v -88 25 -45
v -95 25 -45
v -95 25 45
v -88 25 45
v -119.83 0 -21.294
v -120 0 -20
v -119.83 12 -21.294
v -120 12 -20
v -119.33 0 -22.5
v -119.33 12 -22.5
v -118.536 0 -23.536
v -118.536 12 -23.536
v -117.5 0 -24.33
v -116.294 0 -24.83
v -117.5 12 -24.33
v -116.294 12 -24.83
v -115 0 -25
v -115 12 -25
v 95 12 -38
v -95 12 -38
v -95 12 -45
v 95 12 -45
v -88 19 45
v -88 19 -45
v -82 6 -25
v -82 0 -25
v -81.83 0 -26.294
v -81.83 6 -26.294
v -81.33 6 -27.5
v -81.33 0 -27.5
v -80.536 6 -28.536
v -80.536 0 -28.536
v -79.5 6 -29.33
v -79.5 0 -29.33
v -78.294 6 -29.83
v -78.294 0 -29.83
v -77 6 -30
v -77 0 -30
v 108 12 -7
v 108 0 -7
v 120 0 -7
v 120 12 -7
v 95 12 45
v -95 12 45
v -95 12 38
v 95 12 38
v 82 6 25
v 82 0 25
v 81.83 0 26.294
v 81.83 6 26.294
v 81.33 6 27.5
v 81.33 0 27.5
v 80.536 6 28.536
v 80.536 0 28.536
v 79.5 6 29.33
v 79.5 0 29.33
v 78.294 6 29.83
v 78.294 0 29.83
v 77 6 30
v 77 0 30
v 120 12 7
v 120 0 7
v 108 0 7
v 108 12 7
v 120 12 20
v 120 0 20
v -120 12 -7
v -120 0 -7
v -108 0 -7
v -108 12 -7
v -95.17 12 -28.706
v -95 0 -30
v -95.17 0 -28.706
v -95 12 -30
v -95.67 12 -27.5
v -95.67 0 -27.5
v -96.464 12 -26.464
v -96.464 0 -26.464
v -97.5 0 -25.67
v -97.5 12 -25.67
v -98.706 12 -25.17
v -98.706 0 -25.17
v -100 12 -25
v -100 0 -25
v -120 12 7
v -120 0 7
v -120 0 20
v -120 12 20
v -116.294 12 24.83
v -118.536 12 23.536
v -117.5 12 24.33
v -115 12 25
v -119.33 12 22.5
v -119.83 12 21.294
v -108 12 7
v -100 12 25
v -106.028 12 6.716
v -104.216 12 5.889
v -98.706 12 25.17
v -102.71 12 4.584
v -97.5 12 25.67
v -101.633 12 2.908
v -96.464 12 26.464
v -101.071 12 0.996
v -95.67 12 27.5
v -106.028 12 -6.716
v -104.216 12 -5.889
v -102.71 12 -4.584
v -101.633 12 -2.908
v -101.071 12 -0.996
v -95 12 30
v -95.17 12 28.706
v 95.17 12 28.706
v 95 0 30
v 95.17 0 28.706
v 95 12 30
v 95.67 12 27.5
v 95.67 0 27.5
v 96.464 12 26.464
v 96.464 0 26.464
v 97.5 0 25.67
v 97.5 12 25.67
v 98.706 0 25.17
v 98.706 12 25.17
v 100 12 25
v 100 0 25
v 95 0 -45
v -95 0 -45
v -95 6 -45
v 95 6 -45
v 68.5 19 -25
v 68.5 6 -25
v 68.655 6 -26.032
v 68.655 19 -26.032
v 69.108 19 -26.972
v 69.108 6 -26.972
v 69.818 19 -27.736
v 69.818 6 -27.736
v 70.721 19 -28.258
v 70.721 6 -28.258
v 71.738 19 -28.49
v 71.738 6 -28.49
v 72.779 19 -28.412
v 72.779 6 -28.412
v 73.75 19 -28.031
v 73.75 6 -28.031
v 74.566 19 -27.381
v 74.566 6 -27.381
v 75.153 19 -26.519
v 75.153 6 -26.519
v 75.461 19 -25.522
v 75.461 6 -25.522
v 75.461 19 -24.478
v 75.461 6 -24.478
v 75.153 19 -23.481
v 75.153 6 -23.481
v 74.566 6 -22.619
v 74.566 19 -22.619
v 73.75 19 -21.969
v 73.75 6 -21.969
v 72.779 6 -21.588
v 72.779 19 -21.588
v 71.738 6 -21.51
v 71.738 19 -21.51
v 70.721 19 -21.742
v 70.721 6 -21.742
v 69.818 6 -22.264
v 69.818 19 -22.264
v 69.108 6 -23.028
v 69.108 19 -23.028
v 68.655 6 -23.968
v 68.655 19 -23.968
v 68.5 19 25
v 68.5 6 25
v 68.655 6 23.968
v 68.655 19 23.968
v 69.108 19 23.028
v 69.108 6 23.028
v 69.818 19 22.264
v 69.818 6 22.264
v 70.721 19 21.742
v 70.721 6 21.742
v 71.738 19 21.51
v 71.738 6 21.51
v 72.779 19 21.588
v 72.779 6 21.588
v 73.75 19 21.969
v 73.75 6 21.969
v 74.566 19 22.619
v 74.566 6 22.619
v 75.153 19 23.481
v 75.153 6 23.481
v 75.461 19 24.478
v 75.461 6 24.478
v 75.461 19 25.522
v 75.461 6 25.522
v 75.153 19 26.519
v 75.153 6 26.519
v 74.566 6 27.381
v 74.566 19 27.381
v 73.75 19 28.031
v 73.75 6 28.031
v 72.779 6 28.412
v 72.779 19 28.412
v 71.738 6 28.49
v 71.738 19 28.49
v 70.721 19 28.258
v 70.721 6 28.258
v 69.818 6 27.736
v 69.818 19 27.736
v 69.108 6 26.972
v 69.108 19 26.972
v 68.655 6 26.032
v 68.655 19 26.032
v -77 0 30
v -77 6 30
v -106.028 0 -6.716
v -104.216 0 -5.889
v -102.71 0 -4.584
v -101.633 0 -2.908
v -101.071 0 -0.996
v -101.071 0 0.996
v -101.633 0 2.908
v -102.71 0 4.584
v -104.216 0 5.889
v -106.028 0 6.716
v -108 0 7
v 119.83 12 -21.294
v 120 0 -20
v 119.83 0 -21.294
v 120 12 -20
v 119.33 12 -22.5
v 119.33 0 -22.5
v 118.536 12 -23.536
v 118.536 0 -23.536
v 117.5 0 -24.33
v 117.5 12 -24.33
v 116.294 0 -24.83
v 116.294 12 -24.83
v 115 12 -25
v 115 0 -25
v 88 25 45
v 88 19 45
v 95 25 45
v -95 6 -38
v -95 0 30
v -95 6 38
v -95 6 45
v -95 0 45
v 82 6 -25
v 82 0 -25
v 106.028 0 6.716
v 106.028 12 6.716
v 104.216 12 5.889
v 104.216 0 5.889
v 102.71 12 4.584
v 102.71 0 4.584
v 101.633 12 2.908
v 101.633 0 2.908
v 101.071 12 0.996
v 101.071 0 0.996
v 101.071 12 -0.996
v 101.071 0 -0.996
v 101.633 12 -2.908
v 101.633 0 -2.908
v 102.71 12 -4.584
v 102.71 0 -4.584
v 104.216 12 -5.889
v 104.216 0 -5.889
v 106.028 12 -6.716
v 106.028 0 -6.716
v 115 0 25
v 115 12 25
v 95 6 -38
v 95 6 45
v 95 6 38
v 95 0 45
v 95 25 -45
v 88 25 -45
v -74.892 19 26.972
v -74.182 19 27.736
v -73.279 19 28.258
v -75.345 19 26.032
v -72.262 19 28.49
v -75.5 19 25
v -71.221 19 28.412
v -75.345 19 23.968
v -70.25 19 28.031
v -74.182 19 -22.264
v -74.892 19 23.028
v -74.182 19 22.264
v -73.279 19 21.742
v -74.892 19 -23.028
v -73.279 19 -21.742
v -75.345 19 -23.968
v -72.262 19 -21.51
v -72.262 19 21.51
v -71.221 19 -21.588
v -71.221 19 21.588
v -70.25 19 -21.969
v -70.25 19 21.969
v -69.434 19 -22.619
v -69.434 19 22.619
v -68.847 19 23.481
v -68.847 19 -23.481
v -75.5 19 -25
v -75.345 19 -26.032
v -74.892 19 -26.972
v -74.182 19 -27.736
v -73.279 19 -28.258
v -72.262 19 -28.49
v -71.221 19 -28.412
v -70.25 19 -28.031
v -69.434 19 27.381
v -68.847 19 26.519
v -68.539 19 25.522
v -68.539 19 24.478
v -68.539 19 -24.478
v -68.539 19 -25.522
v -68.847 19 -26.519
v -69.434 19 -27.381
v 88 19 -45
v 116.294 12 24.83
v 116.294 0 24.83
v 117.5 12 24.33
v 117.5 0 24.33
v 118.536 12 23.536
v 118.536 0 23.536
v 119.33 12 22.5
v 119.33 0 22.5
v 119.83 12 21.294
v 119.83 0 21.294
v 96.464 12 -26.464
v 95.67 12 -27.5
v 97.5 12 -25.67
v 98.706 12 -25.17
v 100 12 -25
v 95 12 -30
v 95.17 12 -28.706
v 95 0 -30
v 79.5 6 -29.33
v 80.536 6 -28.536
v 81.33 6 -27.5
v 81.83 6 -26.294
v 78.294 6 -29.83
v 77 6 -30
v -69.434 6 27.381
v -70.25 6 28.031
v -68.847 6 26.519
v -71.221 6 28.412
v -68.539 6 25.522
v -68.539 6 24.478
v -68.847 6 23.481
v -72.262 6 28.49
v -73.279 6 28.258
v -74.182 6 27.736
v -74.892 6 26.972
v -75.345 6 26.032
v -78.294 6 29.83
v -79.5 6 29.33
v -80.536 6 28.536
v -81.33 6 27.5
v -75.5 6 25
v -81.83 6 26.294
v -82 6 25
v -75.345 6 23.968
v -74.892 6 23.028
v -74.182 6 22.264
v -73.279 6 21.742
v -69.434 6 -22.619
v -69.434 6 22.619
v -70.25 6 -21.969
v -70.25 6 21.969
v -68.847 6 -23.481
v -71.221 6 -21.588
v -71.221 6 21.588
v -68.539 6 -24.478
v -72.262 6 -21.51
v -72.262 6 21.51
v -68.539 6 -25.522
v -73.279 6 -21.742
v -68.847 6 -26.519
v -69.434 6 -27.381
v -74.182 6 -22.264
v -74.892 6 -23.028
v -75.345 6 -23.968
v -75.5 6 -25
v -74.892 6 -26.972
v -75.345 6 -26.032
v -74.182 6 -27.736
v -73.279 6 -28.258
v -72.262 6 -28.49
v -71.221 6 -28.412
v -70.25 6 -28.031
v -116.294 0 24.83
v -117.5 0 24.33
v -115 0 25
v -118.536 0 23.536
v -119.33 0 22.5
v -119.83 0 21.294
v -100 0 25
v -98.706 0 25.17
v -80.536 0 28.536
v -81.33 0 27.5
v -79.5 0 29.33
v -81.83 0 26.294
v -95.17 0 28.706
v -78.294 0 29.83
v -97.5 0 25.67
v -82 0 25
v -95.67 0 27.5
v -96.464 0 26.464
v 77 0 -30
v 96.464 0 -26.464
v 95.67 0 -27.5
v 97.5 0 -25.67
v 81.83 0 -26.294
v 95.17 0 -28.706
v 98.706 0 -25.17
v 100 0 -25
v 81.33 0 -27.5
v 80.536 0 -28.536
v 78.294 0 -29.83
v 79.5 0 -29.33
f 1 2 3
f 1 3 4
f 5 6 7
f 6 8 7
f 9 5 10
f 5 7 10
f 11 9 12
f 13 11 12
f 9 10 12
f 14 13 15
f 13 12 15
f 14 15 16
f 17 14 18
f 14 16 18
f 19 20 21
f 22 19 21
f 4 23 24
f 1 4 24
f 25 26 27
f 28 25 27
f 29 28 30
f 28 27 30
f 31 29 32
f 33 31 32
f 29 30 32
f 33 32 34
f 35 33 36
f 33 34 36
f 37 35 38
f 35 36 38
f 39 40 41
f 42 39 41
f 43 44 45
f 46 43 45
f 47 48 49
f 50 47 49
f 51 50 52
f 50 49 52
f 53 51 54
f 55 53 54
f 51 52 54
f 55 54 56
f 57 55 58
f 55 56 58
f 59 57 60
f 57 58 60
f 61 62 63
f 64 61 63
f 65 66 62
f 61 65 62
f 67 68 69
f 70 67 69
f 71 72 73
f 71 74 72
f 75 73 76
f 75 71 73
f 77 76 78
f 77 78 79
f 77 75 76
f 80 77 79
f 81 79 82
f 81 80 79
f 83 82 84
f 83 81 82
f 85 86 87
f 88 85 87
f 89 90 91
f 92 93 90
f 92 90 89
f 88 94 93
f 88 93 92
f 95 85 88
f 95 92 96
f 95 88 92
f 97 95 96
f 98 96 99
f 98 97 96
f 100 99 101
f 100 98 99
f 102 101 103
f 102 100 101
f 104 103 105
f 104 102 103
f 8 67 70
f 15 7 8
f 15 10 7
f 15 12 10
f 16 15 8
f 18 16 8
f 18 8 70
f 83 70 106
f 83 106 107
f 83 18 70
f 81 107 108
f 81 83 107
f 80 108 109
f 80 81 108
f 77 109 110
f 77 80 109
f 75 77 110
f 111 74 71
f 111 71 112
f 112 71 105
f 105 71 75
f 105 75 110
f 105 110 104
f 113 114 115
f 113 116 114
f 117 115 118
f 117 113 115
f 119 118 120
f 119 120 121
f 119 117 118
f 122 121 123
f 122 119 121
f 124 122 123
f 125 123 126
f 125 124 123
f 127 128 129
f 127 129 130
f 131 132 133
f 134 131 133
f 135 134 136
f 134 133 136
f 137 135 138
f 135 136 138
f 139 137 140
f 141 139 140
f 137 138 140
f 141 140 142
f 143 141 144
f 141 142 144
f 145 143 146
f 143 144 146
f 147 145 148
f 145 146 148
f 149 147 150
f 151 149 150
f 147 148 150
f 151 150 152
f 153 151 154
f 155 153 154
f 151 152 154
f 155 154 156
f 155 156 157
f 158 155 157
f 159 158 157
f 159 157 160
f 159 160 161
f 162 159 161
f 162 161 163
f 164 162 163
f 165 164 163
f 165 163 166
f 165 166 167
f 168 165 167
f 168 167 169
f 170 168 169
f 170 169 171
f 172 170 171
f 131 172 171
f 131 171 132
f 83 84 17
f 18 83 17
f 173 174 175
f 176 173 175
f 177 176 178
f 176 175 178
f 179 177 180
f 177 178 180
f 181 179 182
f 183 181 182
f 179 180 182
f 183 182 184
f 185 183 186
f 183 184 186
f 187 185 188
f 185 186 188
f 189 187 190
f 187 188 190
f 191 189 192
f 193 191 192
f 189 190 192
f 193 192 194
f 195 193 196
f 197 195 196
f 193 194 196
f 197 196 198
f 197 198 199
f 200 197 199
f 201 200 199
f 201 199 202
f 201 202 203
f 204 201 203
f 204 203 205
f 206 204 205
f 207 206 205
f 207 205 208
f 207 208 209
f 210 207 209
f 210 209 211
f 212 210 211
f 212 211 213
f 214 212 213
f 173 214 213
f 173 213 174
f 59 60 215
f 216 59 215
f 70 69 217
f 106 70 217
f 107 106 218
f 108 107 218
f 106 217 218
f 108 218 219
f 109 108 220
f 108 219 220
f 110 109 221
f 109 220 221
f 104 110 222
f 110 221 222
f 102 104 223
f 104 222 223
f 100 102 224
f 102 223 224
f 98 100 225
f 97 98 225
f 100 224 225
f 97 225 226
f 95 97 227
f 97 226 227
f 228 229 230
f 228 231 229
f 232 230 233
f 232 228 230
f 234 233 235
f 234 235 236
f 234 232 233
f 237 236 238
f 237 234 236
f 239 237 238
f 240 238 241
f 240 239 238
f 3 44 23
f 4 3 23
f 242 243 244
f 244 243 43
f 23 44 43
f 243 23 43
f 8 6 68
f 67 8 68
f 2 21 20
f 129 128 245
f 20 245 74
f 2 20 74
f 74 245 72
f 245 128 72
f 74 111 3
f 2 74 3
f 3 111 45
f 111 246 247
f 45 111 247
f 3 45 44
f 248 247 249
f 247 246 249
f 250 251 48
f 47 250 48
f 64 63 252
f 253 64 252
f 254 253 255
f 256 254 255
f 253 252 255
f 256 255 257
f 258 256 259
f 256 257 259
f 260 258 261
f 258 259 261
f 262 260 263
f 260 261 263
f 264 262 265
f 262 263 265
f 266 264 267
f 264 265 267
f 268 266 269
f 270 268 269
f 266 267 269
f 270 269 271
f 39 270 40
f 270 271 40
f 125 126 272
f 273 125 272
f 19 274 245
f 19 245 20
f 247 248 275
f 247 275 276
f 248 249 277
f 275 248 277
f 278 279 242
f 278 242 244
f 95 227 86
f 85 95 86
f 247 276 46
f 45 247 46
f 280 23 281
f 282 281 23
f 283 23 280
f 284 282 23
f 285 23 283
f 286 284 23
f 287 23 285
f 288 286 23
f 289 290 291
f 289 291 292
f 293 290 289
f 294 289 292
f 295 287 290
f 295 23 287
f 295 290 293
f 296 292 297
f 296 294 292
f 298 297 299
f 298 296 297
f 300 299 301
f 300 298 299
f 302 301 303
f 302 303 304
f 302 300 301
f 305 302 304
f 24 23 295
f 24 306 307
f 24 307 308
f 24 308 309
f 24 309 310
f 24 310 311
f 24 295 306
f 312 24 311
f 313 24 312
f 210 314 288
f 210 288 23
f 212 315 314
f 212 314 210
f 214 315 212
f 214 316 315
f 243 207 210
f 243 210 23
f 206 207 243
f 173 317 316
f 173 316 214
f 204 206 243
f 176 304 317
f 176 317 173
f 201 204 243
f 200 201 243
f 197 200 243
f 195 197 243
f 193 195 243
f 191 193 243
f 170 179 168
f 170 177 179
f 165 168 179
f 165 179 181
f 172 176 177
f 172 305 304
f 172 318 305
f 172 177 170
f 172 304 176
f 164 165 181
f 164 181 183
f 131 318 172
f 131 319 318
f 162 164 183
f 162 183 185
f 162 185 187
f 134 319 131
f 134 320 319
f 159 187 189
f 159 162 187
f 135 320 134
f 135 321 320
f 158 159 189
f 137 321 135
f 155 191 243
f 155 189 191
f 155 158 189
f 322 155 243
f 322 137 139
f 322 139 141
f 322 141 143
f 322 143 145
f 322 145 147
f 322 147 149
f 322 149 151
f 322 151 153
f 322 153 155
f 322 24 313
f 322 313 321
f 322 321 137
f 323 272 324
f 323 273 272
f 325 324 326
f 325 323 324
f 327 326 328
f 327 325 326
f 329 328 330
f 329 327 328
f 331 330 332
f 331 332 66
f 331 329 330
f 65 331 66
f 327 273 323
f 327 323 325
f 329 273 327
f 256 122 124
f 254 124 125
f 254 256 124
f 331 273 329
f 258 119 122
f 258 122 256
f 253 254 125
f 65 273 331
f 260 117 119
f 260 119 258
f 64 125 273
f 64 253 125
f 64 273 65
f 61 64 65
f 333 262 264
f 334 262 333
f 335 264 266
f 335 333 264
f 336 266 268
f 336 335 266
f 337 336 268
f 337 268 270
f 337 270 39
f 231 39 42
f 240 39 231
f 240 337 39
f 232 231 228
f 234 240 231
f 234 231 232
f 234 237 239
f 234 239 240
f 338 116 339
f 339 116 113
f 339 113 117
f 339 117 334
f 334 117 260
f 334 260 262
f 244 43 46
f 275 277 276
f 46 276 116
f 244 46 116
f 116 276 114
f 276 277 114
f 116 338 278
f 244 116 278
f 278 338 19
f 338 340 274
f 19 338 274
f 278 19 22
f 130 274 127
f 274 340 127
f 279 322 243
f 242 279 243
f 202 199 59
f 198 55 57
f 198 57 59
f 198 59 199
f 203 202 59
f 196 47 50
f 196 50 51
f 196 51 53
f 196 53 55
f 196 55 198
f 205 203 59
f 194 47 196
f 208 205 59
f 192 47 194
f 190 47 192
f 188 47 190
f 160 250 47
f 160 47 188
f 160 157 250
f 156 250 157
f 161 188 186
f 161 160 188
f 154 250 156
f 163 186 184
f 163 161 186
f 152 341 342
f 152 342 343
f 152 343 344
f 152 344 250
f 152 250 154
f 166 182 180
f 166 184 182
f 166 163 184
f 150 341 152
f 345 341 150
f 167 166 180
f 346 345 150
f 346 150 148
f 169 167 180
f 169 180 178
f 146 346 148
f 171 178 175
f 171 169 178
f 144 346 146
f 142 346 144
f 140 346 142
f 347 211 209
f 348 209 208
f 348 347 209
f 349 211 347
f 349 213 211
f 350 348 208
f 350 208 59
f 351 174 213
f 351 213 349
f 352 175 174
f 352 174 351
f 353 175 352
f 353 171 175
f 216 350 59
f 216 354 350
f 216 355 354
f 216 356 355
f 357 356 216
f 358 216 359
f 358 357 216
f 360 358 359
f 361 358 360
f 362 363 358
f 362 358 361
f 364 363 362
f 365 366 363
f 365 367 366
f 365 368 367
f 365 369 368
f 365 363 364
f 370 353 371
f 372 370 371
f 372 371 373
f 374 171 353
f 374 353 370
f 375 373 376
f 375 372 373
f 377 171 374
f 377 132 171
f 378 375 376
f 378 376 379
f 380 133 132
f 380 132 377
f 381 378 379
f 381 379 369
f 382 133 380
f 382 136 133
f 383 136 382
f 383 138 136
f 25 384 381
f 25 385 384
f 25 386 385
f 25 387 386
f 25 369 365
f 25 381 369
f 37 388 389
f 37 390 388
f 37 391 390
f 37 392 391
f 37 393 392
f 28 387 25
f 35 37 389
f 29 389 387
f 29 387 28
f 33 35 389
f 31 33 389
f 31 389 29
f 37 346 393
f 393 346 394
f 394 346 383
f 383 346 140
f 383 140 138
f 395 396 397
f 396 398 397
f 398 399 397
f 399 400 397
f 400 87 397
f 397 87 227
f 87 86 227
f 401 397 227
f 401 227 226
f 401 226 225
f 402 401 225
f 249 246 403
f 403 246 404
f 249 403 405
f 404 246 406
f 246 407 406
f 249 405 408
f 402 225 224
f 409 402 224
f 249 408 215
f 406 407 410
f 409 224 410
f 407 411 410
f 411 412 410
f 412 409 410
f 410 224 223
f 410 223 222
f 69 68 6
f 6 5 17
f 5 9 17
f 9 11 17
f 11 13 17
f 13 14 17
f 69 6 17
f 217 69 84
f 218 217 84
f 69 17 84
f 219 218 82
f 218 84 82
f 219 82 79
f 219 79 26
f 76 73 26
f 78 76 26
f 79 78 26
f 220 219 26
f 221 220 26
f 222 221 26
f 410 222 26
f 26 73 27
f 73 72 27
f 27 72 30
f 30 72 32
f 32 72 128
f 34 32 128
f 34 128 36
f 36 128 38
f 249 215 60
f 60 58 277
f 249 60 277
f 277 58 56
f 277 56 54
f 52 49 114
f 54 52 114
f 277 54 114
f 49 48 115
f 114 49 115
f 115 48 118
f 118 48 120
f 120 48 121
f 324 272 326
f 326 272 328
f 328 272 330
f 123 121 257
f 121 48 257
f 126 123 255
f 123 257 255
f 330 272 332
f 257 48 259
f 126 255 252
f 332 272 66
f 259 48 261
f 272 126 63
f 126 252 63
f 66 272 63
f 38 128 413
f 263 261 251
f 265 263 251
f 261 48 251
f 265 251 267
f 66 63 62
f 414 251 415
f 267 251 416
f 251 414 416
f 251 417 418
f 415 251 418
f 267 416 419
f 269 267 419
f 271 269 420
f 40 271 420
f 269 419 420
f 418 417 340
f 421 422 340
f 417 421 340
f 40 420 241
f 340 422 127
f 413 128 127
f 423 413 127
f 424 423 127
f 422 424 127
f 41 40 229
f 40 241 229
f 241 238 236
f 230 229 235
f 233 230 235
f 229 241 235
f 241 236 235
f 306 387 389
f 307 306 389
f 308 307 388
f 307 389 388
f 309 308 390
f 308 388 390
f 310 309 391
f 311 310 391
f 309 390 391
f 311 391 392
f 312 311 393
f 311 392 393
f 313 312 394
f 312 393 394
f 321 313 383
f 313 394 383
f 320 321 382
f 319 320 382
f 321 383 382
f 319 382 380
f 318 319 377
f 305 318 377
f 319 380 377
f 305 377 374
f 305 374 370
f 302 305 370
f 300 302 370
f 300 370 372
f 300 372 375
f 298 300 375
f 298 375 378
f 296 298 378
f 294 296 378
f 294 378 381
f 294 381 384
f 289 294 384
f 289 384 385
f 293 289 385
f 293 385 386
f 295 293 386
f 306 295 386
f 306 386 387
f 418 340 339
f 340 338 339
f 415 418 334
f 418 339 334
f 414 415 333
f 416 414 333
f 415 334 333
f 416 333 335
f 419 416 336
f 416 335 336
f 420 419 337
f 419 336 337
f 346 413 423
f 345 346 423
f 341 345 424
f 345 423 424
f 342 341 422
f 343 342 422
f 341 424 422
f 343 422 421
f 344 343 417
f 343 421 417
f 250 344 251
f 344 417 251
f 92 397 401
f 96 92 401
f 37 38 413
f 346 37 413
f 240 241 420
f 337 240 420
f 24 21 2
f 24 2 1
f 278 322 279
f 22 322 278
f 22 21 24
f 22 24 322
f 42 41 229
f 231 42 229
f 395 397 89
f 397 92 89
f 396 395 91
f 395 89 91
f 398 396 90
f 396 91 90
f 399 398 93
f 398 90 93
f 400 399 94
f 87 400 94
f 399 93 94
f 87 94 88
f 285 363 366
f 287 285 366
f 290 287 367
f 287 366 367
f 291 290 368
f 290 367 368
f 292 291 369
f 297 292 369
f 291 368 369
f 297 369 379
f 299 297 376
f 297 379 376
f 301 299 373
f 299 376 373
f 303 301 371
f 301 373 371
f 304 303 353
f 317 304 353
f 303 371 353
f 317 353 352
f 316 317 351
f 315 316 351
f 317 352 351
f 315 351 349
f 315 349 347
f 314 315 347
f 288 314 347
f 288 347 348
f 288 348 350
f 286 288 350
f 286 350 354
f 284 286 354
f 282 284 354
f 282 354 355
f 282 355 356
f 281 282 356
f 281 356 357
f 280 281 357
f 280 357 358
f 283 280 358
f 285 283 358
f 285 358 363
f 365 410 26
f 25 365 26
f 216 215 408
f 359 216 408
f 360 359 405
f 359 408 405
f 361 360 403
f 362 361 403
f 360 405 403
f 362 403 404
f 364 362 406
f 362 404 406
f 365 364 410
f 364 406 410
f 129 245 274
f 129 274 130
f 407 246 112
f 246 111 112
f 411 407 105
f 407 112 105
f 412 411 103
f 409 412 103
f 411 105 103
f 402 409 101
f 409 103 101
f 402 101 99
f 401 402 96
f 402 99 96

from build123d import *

# Parameters (mm, degrees)
BOSS_EXTRUDE1_DEPTH   = 25
BOSS_EXTRUDE1_2_DEPTH = 25
SKETCH1_3_W           = 176
SKETCH1_3_H           = 90
BOSS_EXTRUDE2_DEPTH   = 19
BOSS_EXTRUDE3_DEPTH   = 12
CUT_EXTRUDE1_DEPTH    = 6
CUT_EXTRUDE2_REACH    = 223.077
SKETCH2_W             = 7
SKETCH2_H             = 6
M8X1_0_TAPPED_HOLE1_D = 7
LPATTERN1_COUNT       = 2
LPATTERN1_PITCH       = 50
LPATTERN1_COUNT_DIR2  = 2
LPATTERN1_PITCH_DIR2  = 144
FILLET1_R             = 5


with BuildPart() as part:
    # Sketch1 → Boss-Extrude1 (new body)
    with BuildSketch(Plane(origin=(0, 0, 0), x_dir=(1, 0, 0), z_dir=(0, 1, 0))):
        Polygon((95, 45), (88, 45), (88, -45), (95, -45), (95, -25), (95, 25), align=None)
    extrude(amount=BOSS_EXTRUDE1_DEPTH)



with BuildPart() as body_2:
    # Sketch1 → Boss-Extrude1 2 (new body)
    with BuildSketch(Plane(origin=(0, 0, 0), x_dir=(1, 0, 0), z_dir=(0, 1, 0))):
        Polygon((-88, -45), (-88, 45), (-95, 45), (-95, 25), (-95, -25), (-95, -45), align=None)
    extrude(amount=BOSS_EXTRUDE1_2_DEPTH)


with BuildPart() as part_1:
    add(part.part)

    add(body_2.part)  # Boss-Extrude2 merges body 2
    # Sketch1<3> → Boss-Extrude2 (add)
    # profile 1 of 2: a face of its own
    with BuildSketch(Plane(origin=(0, 0, 0), x_dir=(1, 0, 0), z_dir=(0, 1, 0))):
        Rectangle(SKETCH1_3_W, SKETCH1_3_H)
        with BuildLine():
            ThreePointArc((-82, 25), (-80.535533906, 28.535533906), (-77, 30))
            Line((-77, 30), (77, 30))
            ThreePointArc((77, 30), (80.535533906, 28.535533906), (82, 25))
            Line((82, 25), (82, -25))
            ThreePointArc((82, -25), (80.535533906, -28.535533906), (77, -30))
            Line((77, -30), (-77, -30))
            ThreePointArc((-77, -30), (-80.535533906, -28.535533906), (-82, -25))
            Line((-82, -25), (-82, 25))
        make_face(mode=Mode.SUBTRACT)
    # profile 2 of 2: a face of its own
    with BuildSketch(Plane(origin=(0, 0, 0), x_dir=(1, 0, 0), z_dir=(0, 1, 0))):
        with BuildLine():
            Line((-77, 30), (77, 30))
            ThreePointArc((77, 30), (80.535533906, 28.535533906), (82, 25))
            Line((82, 25), (82, -25))
            ThreePointArc((82, -25), (80.535533906, -28.535533906), (77, -30))
            Line((77, -30), (-77, -30))
            ThreePointArc((-77, -30), (-80.535533906, -28.535533906), (-82, -25))
            Line((-82, -25), (-82, 25))
            ThreePointArc((-82, 25), (-80.535533906, 28.535533906), (-77, 30))
        make_face()
    extrude(amount=BOSS_EXTRUDE2_DEPTH)

    # Sketch1<4> → Boss-Extrude3 (add)
    with BuildSketch(Plane(origin=(0, 0, 0), x_dir=(1, 0, 0), z_dir=(0, 1, 0))):
        with BuildLine():
            Line((120, 25), (95, 25))
            Line((95, 25), (95, -25))
            Line((95, -25), (120, -25))
            Line((120, -25), (120, -7))
            Line((120, -7), (108, -7))
            ThreePointArc((108, -7), (101, 0), (108, 7))
            Line((108, 7), (120, 7))
            Line((120, 7), (120, 25))
        make_face()
        with BuildLine():
            Line((-95, -25), (-95, 25))
            Line((-95, 25), (-120, 25))
            Line((-120, 25), (-120, 7))
            Line((-120, 7), (-108, 7))
            ThreePointArc((-108, 7), (-101, 0), (-108, -7))
            Line((-108, -7), (-120, -7))
            Line((-120, -7), (-120, -25))
            Line((-120, -25), (-95, -25))
        make_face()
    extrude(amount=BOSS_EXTRUDE3_DEPTH)

    # Sketch1<5> → Cut-Extrude1 (cut)
    with BuildSketch(Plane(origin=(0, 0, 0), x_dir=(1, 0, 0), z_dir=(0, 1, 0))):
        with BuildLine():
            Line((-77, 30), (77, 30))
            ThreePointArc((77, 30), (80.535533906, 28.535533906), (82, 25))
            Line((82, 25), (82, -25))
            ThreePointArc((82, -25), (80.535533906, -28.535533906), (77, -30))
            Line((77, -30), (-77, -30))
            ThreePointArc((-77, -30), (-80.535533906, -28.535533906), (-82, -25))
            Line((-82, -25), (-82, 25))
            ThreePointArc((-82, 25), (-80.535533906, 28.535533906), (-77, 30))
        make_face()
    extrude(amount=CUT_EXTRUDE1_DEPTH, mode=Mode.SUBTRACT)

    # Sketch2 → Cut-Extrude2 (cut, up to next)
    with BuildSketch(Plane(origin=(95, 0, 0), x_dir=(0, 0, -1), z_dir=(1, 0, 0)), mode=Mode.PRIVATE) as cut_extrude2_sk1:
        with Locations((41.5, 9)):
            Rectangle(SKETCH2_W, SKETCH2_H)
    cut_extrude2_tool1 = extrude(cut_extrude2_sk1.sketch, amount=-CUT_EXTRUDE2_REACH, mode=Mode.PRIVATE) & part_1.part
    # Sketch2 → Cut-Extrude2 (cut, up to next)
    with BuildSketch(Plane(origin=(95, 0, 0), x_dir=(0, 0, -1), z_dir=(1, 0, 0)), mode=Mode.PRIVATE) as cut_extrude2_sk2:
        with Locations((-41.5, 9)):
            Rectangle(SKETCH2_W, SKETCH2_H)
    cut_extrude2_tool2 = extrude(cut_extrude2_sk2.sketch, amount=-CUT_EXTRUDE2_REACH, mode=Mode.PRIVATE) & part_1.part
    add(cut_extrude2_tool1.solids().sort_by_distance((95, 9, -41.5))[0], mode=Mode.SUBTRACT)
    add(cut_extrude2_tool2.solids().sort_by_distance((95, 9, 41.5))[0], mode=Mode.SUBTRACT)

    # M8x1.0 Tapped Hole1 (through all)
    with Locations(Plane(origin=(0, 19, 0), x_dir=(1, 0, 0), z_dir=(0, 1, 0))):
        with Locations((72, -25)):
            m8x1_0_tapped_hole1 = Hole(M8X1_0_TAPPED_HOLE1_D / 2)

    # LPattern1: M8x1.0 Tapped Hole1 2 × 2
    with Locations(*[(-j * LPATTERN1_PITCH_DIR2, 0, -i * LPATTERN1_PITCH) for i in range(LPATTERN1_COUNT) for j in range(LPATTERN1_COUNT_DIR2) if (i, j) != (0, 0)]):
        add(m8x1_0_tapped_hole1, mode=Mode.SUBTRACT)

    # Fillet1
    fillet1_edges = [part_1.edges().sort_by_distance(p)[0] for p in [
        (120, 6, -25),
        (95, 6, -25),
        (95, 6, 25),
        (120, 6, 25),
        (-120, 6, 25),
        (-95, 6, 25),
        (-95, 6, -25),
        (-120, 6, -25),
    ]]
    fillet(fillet1_edges, radius=FILLET1_R)


solid = part_1.part
